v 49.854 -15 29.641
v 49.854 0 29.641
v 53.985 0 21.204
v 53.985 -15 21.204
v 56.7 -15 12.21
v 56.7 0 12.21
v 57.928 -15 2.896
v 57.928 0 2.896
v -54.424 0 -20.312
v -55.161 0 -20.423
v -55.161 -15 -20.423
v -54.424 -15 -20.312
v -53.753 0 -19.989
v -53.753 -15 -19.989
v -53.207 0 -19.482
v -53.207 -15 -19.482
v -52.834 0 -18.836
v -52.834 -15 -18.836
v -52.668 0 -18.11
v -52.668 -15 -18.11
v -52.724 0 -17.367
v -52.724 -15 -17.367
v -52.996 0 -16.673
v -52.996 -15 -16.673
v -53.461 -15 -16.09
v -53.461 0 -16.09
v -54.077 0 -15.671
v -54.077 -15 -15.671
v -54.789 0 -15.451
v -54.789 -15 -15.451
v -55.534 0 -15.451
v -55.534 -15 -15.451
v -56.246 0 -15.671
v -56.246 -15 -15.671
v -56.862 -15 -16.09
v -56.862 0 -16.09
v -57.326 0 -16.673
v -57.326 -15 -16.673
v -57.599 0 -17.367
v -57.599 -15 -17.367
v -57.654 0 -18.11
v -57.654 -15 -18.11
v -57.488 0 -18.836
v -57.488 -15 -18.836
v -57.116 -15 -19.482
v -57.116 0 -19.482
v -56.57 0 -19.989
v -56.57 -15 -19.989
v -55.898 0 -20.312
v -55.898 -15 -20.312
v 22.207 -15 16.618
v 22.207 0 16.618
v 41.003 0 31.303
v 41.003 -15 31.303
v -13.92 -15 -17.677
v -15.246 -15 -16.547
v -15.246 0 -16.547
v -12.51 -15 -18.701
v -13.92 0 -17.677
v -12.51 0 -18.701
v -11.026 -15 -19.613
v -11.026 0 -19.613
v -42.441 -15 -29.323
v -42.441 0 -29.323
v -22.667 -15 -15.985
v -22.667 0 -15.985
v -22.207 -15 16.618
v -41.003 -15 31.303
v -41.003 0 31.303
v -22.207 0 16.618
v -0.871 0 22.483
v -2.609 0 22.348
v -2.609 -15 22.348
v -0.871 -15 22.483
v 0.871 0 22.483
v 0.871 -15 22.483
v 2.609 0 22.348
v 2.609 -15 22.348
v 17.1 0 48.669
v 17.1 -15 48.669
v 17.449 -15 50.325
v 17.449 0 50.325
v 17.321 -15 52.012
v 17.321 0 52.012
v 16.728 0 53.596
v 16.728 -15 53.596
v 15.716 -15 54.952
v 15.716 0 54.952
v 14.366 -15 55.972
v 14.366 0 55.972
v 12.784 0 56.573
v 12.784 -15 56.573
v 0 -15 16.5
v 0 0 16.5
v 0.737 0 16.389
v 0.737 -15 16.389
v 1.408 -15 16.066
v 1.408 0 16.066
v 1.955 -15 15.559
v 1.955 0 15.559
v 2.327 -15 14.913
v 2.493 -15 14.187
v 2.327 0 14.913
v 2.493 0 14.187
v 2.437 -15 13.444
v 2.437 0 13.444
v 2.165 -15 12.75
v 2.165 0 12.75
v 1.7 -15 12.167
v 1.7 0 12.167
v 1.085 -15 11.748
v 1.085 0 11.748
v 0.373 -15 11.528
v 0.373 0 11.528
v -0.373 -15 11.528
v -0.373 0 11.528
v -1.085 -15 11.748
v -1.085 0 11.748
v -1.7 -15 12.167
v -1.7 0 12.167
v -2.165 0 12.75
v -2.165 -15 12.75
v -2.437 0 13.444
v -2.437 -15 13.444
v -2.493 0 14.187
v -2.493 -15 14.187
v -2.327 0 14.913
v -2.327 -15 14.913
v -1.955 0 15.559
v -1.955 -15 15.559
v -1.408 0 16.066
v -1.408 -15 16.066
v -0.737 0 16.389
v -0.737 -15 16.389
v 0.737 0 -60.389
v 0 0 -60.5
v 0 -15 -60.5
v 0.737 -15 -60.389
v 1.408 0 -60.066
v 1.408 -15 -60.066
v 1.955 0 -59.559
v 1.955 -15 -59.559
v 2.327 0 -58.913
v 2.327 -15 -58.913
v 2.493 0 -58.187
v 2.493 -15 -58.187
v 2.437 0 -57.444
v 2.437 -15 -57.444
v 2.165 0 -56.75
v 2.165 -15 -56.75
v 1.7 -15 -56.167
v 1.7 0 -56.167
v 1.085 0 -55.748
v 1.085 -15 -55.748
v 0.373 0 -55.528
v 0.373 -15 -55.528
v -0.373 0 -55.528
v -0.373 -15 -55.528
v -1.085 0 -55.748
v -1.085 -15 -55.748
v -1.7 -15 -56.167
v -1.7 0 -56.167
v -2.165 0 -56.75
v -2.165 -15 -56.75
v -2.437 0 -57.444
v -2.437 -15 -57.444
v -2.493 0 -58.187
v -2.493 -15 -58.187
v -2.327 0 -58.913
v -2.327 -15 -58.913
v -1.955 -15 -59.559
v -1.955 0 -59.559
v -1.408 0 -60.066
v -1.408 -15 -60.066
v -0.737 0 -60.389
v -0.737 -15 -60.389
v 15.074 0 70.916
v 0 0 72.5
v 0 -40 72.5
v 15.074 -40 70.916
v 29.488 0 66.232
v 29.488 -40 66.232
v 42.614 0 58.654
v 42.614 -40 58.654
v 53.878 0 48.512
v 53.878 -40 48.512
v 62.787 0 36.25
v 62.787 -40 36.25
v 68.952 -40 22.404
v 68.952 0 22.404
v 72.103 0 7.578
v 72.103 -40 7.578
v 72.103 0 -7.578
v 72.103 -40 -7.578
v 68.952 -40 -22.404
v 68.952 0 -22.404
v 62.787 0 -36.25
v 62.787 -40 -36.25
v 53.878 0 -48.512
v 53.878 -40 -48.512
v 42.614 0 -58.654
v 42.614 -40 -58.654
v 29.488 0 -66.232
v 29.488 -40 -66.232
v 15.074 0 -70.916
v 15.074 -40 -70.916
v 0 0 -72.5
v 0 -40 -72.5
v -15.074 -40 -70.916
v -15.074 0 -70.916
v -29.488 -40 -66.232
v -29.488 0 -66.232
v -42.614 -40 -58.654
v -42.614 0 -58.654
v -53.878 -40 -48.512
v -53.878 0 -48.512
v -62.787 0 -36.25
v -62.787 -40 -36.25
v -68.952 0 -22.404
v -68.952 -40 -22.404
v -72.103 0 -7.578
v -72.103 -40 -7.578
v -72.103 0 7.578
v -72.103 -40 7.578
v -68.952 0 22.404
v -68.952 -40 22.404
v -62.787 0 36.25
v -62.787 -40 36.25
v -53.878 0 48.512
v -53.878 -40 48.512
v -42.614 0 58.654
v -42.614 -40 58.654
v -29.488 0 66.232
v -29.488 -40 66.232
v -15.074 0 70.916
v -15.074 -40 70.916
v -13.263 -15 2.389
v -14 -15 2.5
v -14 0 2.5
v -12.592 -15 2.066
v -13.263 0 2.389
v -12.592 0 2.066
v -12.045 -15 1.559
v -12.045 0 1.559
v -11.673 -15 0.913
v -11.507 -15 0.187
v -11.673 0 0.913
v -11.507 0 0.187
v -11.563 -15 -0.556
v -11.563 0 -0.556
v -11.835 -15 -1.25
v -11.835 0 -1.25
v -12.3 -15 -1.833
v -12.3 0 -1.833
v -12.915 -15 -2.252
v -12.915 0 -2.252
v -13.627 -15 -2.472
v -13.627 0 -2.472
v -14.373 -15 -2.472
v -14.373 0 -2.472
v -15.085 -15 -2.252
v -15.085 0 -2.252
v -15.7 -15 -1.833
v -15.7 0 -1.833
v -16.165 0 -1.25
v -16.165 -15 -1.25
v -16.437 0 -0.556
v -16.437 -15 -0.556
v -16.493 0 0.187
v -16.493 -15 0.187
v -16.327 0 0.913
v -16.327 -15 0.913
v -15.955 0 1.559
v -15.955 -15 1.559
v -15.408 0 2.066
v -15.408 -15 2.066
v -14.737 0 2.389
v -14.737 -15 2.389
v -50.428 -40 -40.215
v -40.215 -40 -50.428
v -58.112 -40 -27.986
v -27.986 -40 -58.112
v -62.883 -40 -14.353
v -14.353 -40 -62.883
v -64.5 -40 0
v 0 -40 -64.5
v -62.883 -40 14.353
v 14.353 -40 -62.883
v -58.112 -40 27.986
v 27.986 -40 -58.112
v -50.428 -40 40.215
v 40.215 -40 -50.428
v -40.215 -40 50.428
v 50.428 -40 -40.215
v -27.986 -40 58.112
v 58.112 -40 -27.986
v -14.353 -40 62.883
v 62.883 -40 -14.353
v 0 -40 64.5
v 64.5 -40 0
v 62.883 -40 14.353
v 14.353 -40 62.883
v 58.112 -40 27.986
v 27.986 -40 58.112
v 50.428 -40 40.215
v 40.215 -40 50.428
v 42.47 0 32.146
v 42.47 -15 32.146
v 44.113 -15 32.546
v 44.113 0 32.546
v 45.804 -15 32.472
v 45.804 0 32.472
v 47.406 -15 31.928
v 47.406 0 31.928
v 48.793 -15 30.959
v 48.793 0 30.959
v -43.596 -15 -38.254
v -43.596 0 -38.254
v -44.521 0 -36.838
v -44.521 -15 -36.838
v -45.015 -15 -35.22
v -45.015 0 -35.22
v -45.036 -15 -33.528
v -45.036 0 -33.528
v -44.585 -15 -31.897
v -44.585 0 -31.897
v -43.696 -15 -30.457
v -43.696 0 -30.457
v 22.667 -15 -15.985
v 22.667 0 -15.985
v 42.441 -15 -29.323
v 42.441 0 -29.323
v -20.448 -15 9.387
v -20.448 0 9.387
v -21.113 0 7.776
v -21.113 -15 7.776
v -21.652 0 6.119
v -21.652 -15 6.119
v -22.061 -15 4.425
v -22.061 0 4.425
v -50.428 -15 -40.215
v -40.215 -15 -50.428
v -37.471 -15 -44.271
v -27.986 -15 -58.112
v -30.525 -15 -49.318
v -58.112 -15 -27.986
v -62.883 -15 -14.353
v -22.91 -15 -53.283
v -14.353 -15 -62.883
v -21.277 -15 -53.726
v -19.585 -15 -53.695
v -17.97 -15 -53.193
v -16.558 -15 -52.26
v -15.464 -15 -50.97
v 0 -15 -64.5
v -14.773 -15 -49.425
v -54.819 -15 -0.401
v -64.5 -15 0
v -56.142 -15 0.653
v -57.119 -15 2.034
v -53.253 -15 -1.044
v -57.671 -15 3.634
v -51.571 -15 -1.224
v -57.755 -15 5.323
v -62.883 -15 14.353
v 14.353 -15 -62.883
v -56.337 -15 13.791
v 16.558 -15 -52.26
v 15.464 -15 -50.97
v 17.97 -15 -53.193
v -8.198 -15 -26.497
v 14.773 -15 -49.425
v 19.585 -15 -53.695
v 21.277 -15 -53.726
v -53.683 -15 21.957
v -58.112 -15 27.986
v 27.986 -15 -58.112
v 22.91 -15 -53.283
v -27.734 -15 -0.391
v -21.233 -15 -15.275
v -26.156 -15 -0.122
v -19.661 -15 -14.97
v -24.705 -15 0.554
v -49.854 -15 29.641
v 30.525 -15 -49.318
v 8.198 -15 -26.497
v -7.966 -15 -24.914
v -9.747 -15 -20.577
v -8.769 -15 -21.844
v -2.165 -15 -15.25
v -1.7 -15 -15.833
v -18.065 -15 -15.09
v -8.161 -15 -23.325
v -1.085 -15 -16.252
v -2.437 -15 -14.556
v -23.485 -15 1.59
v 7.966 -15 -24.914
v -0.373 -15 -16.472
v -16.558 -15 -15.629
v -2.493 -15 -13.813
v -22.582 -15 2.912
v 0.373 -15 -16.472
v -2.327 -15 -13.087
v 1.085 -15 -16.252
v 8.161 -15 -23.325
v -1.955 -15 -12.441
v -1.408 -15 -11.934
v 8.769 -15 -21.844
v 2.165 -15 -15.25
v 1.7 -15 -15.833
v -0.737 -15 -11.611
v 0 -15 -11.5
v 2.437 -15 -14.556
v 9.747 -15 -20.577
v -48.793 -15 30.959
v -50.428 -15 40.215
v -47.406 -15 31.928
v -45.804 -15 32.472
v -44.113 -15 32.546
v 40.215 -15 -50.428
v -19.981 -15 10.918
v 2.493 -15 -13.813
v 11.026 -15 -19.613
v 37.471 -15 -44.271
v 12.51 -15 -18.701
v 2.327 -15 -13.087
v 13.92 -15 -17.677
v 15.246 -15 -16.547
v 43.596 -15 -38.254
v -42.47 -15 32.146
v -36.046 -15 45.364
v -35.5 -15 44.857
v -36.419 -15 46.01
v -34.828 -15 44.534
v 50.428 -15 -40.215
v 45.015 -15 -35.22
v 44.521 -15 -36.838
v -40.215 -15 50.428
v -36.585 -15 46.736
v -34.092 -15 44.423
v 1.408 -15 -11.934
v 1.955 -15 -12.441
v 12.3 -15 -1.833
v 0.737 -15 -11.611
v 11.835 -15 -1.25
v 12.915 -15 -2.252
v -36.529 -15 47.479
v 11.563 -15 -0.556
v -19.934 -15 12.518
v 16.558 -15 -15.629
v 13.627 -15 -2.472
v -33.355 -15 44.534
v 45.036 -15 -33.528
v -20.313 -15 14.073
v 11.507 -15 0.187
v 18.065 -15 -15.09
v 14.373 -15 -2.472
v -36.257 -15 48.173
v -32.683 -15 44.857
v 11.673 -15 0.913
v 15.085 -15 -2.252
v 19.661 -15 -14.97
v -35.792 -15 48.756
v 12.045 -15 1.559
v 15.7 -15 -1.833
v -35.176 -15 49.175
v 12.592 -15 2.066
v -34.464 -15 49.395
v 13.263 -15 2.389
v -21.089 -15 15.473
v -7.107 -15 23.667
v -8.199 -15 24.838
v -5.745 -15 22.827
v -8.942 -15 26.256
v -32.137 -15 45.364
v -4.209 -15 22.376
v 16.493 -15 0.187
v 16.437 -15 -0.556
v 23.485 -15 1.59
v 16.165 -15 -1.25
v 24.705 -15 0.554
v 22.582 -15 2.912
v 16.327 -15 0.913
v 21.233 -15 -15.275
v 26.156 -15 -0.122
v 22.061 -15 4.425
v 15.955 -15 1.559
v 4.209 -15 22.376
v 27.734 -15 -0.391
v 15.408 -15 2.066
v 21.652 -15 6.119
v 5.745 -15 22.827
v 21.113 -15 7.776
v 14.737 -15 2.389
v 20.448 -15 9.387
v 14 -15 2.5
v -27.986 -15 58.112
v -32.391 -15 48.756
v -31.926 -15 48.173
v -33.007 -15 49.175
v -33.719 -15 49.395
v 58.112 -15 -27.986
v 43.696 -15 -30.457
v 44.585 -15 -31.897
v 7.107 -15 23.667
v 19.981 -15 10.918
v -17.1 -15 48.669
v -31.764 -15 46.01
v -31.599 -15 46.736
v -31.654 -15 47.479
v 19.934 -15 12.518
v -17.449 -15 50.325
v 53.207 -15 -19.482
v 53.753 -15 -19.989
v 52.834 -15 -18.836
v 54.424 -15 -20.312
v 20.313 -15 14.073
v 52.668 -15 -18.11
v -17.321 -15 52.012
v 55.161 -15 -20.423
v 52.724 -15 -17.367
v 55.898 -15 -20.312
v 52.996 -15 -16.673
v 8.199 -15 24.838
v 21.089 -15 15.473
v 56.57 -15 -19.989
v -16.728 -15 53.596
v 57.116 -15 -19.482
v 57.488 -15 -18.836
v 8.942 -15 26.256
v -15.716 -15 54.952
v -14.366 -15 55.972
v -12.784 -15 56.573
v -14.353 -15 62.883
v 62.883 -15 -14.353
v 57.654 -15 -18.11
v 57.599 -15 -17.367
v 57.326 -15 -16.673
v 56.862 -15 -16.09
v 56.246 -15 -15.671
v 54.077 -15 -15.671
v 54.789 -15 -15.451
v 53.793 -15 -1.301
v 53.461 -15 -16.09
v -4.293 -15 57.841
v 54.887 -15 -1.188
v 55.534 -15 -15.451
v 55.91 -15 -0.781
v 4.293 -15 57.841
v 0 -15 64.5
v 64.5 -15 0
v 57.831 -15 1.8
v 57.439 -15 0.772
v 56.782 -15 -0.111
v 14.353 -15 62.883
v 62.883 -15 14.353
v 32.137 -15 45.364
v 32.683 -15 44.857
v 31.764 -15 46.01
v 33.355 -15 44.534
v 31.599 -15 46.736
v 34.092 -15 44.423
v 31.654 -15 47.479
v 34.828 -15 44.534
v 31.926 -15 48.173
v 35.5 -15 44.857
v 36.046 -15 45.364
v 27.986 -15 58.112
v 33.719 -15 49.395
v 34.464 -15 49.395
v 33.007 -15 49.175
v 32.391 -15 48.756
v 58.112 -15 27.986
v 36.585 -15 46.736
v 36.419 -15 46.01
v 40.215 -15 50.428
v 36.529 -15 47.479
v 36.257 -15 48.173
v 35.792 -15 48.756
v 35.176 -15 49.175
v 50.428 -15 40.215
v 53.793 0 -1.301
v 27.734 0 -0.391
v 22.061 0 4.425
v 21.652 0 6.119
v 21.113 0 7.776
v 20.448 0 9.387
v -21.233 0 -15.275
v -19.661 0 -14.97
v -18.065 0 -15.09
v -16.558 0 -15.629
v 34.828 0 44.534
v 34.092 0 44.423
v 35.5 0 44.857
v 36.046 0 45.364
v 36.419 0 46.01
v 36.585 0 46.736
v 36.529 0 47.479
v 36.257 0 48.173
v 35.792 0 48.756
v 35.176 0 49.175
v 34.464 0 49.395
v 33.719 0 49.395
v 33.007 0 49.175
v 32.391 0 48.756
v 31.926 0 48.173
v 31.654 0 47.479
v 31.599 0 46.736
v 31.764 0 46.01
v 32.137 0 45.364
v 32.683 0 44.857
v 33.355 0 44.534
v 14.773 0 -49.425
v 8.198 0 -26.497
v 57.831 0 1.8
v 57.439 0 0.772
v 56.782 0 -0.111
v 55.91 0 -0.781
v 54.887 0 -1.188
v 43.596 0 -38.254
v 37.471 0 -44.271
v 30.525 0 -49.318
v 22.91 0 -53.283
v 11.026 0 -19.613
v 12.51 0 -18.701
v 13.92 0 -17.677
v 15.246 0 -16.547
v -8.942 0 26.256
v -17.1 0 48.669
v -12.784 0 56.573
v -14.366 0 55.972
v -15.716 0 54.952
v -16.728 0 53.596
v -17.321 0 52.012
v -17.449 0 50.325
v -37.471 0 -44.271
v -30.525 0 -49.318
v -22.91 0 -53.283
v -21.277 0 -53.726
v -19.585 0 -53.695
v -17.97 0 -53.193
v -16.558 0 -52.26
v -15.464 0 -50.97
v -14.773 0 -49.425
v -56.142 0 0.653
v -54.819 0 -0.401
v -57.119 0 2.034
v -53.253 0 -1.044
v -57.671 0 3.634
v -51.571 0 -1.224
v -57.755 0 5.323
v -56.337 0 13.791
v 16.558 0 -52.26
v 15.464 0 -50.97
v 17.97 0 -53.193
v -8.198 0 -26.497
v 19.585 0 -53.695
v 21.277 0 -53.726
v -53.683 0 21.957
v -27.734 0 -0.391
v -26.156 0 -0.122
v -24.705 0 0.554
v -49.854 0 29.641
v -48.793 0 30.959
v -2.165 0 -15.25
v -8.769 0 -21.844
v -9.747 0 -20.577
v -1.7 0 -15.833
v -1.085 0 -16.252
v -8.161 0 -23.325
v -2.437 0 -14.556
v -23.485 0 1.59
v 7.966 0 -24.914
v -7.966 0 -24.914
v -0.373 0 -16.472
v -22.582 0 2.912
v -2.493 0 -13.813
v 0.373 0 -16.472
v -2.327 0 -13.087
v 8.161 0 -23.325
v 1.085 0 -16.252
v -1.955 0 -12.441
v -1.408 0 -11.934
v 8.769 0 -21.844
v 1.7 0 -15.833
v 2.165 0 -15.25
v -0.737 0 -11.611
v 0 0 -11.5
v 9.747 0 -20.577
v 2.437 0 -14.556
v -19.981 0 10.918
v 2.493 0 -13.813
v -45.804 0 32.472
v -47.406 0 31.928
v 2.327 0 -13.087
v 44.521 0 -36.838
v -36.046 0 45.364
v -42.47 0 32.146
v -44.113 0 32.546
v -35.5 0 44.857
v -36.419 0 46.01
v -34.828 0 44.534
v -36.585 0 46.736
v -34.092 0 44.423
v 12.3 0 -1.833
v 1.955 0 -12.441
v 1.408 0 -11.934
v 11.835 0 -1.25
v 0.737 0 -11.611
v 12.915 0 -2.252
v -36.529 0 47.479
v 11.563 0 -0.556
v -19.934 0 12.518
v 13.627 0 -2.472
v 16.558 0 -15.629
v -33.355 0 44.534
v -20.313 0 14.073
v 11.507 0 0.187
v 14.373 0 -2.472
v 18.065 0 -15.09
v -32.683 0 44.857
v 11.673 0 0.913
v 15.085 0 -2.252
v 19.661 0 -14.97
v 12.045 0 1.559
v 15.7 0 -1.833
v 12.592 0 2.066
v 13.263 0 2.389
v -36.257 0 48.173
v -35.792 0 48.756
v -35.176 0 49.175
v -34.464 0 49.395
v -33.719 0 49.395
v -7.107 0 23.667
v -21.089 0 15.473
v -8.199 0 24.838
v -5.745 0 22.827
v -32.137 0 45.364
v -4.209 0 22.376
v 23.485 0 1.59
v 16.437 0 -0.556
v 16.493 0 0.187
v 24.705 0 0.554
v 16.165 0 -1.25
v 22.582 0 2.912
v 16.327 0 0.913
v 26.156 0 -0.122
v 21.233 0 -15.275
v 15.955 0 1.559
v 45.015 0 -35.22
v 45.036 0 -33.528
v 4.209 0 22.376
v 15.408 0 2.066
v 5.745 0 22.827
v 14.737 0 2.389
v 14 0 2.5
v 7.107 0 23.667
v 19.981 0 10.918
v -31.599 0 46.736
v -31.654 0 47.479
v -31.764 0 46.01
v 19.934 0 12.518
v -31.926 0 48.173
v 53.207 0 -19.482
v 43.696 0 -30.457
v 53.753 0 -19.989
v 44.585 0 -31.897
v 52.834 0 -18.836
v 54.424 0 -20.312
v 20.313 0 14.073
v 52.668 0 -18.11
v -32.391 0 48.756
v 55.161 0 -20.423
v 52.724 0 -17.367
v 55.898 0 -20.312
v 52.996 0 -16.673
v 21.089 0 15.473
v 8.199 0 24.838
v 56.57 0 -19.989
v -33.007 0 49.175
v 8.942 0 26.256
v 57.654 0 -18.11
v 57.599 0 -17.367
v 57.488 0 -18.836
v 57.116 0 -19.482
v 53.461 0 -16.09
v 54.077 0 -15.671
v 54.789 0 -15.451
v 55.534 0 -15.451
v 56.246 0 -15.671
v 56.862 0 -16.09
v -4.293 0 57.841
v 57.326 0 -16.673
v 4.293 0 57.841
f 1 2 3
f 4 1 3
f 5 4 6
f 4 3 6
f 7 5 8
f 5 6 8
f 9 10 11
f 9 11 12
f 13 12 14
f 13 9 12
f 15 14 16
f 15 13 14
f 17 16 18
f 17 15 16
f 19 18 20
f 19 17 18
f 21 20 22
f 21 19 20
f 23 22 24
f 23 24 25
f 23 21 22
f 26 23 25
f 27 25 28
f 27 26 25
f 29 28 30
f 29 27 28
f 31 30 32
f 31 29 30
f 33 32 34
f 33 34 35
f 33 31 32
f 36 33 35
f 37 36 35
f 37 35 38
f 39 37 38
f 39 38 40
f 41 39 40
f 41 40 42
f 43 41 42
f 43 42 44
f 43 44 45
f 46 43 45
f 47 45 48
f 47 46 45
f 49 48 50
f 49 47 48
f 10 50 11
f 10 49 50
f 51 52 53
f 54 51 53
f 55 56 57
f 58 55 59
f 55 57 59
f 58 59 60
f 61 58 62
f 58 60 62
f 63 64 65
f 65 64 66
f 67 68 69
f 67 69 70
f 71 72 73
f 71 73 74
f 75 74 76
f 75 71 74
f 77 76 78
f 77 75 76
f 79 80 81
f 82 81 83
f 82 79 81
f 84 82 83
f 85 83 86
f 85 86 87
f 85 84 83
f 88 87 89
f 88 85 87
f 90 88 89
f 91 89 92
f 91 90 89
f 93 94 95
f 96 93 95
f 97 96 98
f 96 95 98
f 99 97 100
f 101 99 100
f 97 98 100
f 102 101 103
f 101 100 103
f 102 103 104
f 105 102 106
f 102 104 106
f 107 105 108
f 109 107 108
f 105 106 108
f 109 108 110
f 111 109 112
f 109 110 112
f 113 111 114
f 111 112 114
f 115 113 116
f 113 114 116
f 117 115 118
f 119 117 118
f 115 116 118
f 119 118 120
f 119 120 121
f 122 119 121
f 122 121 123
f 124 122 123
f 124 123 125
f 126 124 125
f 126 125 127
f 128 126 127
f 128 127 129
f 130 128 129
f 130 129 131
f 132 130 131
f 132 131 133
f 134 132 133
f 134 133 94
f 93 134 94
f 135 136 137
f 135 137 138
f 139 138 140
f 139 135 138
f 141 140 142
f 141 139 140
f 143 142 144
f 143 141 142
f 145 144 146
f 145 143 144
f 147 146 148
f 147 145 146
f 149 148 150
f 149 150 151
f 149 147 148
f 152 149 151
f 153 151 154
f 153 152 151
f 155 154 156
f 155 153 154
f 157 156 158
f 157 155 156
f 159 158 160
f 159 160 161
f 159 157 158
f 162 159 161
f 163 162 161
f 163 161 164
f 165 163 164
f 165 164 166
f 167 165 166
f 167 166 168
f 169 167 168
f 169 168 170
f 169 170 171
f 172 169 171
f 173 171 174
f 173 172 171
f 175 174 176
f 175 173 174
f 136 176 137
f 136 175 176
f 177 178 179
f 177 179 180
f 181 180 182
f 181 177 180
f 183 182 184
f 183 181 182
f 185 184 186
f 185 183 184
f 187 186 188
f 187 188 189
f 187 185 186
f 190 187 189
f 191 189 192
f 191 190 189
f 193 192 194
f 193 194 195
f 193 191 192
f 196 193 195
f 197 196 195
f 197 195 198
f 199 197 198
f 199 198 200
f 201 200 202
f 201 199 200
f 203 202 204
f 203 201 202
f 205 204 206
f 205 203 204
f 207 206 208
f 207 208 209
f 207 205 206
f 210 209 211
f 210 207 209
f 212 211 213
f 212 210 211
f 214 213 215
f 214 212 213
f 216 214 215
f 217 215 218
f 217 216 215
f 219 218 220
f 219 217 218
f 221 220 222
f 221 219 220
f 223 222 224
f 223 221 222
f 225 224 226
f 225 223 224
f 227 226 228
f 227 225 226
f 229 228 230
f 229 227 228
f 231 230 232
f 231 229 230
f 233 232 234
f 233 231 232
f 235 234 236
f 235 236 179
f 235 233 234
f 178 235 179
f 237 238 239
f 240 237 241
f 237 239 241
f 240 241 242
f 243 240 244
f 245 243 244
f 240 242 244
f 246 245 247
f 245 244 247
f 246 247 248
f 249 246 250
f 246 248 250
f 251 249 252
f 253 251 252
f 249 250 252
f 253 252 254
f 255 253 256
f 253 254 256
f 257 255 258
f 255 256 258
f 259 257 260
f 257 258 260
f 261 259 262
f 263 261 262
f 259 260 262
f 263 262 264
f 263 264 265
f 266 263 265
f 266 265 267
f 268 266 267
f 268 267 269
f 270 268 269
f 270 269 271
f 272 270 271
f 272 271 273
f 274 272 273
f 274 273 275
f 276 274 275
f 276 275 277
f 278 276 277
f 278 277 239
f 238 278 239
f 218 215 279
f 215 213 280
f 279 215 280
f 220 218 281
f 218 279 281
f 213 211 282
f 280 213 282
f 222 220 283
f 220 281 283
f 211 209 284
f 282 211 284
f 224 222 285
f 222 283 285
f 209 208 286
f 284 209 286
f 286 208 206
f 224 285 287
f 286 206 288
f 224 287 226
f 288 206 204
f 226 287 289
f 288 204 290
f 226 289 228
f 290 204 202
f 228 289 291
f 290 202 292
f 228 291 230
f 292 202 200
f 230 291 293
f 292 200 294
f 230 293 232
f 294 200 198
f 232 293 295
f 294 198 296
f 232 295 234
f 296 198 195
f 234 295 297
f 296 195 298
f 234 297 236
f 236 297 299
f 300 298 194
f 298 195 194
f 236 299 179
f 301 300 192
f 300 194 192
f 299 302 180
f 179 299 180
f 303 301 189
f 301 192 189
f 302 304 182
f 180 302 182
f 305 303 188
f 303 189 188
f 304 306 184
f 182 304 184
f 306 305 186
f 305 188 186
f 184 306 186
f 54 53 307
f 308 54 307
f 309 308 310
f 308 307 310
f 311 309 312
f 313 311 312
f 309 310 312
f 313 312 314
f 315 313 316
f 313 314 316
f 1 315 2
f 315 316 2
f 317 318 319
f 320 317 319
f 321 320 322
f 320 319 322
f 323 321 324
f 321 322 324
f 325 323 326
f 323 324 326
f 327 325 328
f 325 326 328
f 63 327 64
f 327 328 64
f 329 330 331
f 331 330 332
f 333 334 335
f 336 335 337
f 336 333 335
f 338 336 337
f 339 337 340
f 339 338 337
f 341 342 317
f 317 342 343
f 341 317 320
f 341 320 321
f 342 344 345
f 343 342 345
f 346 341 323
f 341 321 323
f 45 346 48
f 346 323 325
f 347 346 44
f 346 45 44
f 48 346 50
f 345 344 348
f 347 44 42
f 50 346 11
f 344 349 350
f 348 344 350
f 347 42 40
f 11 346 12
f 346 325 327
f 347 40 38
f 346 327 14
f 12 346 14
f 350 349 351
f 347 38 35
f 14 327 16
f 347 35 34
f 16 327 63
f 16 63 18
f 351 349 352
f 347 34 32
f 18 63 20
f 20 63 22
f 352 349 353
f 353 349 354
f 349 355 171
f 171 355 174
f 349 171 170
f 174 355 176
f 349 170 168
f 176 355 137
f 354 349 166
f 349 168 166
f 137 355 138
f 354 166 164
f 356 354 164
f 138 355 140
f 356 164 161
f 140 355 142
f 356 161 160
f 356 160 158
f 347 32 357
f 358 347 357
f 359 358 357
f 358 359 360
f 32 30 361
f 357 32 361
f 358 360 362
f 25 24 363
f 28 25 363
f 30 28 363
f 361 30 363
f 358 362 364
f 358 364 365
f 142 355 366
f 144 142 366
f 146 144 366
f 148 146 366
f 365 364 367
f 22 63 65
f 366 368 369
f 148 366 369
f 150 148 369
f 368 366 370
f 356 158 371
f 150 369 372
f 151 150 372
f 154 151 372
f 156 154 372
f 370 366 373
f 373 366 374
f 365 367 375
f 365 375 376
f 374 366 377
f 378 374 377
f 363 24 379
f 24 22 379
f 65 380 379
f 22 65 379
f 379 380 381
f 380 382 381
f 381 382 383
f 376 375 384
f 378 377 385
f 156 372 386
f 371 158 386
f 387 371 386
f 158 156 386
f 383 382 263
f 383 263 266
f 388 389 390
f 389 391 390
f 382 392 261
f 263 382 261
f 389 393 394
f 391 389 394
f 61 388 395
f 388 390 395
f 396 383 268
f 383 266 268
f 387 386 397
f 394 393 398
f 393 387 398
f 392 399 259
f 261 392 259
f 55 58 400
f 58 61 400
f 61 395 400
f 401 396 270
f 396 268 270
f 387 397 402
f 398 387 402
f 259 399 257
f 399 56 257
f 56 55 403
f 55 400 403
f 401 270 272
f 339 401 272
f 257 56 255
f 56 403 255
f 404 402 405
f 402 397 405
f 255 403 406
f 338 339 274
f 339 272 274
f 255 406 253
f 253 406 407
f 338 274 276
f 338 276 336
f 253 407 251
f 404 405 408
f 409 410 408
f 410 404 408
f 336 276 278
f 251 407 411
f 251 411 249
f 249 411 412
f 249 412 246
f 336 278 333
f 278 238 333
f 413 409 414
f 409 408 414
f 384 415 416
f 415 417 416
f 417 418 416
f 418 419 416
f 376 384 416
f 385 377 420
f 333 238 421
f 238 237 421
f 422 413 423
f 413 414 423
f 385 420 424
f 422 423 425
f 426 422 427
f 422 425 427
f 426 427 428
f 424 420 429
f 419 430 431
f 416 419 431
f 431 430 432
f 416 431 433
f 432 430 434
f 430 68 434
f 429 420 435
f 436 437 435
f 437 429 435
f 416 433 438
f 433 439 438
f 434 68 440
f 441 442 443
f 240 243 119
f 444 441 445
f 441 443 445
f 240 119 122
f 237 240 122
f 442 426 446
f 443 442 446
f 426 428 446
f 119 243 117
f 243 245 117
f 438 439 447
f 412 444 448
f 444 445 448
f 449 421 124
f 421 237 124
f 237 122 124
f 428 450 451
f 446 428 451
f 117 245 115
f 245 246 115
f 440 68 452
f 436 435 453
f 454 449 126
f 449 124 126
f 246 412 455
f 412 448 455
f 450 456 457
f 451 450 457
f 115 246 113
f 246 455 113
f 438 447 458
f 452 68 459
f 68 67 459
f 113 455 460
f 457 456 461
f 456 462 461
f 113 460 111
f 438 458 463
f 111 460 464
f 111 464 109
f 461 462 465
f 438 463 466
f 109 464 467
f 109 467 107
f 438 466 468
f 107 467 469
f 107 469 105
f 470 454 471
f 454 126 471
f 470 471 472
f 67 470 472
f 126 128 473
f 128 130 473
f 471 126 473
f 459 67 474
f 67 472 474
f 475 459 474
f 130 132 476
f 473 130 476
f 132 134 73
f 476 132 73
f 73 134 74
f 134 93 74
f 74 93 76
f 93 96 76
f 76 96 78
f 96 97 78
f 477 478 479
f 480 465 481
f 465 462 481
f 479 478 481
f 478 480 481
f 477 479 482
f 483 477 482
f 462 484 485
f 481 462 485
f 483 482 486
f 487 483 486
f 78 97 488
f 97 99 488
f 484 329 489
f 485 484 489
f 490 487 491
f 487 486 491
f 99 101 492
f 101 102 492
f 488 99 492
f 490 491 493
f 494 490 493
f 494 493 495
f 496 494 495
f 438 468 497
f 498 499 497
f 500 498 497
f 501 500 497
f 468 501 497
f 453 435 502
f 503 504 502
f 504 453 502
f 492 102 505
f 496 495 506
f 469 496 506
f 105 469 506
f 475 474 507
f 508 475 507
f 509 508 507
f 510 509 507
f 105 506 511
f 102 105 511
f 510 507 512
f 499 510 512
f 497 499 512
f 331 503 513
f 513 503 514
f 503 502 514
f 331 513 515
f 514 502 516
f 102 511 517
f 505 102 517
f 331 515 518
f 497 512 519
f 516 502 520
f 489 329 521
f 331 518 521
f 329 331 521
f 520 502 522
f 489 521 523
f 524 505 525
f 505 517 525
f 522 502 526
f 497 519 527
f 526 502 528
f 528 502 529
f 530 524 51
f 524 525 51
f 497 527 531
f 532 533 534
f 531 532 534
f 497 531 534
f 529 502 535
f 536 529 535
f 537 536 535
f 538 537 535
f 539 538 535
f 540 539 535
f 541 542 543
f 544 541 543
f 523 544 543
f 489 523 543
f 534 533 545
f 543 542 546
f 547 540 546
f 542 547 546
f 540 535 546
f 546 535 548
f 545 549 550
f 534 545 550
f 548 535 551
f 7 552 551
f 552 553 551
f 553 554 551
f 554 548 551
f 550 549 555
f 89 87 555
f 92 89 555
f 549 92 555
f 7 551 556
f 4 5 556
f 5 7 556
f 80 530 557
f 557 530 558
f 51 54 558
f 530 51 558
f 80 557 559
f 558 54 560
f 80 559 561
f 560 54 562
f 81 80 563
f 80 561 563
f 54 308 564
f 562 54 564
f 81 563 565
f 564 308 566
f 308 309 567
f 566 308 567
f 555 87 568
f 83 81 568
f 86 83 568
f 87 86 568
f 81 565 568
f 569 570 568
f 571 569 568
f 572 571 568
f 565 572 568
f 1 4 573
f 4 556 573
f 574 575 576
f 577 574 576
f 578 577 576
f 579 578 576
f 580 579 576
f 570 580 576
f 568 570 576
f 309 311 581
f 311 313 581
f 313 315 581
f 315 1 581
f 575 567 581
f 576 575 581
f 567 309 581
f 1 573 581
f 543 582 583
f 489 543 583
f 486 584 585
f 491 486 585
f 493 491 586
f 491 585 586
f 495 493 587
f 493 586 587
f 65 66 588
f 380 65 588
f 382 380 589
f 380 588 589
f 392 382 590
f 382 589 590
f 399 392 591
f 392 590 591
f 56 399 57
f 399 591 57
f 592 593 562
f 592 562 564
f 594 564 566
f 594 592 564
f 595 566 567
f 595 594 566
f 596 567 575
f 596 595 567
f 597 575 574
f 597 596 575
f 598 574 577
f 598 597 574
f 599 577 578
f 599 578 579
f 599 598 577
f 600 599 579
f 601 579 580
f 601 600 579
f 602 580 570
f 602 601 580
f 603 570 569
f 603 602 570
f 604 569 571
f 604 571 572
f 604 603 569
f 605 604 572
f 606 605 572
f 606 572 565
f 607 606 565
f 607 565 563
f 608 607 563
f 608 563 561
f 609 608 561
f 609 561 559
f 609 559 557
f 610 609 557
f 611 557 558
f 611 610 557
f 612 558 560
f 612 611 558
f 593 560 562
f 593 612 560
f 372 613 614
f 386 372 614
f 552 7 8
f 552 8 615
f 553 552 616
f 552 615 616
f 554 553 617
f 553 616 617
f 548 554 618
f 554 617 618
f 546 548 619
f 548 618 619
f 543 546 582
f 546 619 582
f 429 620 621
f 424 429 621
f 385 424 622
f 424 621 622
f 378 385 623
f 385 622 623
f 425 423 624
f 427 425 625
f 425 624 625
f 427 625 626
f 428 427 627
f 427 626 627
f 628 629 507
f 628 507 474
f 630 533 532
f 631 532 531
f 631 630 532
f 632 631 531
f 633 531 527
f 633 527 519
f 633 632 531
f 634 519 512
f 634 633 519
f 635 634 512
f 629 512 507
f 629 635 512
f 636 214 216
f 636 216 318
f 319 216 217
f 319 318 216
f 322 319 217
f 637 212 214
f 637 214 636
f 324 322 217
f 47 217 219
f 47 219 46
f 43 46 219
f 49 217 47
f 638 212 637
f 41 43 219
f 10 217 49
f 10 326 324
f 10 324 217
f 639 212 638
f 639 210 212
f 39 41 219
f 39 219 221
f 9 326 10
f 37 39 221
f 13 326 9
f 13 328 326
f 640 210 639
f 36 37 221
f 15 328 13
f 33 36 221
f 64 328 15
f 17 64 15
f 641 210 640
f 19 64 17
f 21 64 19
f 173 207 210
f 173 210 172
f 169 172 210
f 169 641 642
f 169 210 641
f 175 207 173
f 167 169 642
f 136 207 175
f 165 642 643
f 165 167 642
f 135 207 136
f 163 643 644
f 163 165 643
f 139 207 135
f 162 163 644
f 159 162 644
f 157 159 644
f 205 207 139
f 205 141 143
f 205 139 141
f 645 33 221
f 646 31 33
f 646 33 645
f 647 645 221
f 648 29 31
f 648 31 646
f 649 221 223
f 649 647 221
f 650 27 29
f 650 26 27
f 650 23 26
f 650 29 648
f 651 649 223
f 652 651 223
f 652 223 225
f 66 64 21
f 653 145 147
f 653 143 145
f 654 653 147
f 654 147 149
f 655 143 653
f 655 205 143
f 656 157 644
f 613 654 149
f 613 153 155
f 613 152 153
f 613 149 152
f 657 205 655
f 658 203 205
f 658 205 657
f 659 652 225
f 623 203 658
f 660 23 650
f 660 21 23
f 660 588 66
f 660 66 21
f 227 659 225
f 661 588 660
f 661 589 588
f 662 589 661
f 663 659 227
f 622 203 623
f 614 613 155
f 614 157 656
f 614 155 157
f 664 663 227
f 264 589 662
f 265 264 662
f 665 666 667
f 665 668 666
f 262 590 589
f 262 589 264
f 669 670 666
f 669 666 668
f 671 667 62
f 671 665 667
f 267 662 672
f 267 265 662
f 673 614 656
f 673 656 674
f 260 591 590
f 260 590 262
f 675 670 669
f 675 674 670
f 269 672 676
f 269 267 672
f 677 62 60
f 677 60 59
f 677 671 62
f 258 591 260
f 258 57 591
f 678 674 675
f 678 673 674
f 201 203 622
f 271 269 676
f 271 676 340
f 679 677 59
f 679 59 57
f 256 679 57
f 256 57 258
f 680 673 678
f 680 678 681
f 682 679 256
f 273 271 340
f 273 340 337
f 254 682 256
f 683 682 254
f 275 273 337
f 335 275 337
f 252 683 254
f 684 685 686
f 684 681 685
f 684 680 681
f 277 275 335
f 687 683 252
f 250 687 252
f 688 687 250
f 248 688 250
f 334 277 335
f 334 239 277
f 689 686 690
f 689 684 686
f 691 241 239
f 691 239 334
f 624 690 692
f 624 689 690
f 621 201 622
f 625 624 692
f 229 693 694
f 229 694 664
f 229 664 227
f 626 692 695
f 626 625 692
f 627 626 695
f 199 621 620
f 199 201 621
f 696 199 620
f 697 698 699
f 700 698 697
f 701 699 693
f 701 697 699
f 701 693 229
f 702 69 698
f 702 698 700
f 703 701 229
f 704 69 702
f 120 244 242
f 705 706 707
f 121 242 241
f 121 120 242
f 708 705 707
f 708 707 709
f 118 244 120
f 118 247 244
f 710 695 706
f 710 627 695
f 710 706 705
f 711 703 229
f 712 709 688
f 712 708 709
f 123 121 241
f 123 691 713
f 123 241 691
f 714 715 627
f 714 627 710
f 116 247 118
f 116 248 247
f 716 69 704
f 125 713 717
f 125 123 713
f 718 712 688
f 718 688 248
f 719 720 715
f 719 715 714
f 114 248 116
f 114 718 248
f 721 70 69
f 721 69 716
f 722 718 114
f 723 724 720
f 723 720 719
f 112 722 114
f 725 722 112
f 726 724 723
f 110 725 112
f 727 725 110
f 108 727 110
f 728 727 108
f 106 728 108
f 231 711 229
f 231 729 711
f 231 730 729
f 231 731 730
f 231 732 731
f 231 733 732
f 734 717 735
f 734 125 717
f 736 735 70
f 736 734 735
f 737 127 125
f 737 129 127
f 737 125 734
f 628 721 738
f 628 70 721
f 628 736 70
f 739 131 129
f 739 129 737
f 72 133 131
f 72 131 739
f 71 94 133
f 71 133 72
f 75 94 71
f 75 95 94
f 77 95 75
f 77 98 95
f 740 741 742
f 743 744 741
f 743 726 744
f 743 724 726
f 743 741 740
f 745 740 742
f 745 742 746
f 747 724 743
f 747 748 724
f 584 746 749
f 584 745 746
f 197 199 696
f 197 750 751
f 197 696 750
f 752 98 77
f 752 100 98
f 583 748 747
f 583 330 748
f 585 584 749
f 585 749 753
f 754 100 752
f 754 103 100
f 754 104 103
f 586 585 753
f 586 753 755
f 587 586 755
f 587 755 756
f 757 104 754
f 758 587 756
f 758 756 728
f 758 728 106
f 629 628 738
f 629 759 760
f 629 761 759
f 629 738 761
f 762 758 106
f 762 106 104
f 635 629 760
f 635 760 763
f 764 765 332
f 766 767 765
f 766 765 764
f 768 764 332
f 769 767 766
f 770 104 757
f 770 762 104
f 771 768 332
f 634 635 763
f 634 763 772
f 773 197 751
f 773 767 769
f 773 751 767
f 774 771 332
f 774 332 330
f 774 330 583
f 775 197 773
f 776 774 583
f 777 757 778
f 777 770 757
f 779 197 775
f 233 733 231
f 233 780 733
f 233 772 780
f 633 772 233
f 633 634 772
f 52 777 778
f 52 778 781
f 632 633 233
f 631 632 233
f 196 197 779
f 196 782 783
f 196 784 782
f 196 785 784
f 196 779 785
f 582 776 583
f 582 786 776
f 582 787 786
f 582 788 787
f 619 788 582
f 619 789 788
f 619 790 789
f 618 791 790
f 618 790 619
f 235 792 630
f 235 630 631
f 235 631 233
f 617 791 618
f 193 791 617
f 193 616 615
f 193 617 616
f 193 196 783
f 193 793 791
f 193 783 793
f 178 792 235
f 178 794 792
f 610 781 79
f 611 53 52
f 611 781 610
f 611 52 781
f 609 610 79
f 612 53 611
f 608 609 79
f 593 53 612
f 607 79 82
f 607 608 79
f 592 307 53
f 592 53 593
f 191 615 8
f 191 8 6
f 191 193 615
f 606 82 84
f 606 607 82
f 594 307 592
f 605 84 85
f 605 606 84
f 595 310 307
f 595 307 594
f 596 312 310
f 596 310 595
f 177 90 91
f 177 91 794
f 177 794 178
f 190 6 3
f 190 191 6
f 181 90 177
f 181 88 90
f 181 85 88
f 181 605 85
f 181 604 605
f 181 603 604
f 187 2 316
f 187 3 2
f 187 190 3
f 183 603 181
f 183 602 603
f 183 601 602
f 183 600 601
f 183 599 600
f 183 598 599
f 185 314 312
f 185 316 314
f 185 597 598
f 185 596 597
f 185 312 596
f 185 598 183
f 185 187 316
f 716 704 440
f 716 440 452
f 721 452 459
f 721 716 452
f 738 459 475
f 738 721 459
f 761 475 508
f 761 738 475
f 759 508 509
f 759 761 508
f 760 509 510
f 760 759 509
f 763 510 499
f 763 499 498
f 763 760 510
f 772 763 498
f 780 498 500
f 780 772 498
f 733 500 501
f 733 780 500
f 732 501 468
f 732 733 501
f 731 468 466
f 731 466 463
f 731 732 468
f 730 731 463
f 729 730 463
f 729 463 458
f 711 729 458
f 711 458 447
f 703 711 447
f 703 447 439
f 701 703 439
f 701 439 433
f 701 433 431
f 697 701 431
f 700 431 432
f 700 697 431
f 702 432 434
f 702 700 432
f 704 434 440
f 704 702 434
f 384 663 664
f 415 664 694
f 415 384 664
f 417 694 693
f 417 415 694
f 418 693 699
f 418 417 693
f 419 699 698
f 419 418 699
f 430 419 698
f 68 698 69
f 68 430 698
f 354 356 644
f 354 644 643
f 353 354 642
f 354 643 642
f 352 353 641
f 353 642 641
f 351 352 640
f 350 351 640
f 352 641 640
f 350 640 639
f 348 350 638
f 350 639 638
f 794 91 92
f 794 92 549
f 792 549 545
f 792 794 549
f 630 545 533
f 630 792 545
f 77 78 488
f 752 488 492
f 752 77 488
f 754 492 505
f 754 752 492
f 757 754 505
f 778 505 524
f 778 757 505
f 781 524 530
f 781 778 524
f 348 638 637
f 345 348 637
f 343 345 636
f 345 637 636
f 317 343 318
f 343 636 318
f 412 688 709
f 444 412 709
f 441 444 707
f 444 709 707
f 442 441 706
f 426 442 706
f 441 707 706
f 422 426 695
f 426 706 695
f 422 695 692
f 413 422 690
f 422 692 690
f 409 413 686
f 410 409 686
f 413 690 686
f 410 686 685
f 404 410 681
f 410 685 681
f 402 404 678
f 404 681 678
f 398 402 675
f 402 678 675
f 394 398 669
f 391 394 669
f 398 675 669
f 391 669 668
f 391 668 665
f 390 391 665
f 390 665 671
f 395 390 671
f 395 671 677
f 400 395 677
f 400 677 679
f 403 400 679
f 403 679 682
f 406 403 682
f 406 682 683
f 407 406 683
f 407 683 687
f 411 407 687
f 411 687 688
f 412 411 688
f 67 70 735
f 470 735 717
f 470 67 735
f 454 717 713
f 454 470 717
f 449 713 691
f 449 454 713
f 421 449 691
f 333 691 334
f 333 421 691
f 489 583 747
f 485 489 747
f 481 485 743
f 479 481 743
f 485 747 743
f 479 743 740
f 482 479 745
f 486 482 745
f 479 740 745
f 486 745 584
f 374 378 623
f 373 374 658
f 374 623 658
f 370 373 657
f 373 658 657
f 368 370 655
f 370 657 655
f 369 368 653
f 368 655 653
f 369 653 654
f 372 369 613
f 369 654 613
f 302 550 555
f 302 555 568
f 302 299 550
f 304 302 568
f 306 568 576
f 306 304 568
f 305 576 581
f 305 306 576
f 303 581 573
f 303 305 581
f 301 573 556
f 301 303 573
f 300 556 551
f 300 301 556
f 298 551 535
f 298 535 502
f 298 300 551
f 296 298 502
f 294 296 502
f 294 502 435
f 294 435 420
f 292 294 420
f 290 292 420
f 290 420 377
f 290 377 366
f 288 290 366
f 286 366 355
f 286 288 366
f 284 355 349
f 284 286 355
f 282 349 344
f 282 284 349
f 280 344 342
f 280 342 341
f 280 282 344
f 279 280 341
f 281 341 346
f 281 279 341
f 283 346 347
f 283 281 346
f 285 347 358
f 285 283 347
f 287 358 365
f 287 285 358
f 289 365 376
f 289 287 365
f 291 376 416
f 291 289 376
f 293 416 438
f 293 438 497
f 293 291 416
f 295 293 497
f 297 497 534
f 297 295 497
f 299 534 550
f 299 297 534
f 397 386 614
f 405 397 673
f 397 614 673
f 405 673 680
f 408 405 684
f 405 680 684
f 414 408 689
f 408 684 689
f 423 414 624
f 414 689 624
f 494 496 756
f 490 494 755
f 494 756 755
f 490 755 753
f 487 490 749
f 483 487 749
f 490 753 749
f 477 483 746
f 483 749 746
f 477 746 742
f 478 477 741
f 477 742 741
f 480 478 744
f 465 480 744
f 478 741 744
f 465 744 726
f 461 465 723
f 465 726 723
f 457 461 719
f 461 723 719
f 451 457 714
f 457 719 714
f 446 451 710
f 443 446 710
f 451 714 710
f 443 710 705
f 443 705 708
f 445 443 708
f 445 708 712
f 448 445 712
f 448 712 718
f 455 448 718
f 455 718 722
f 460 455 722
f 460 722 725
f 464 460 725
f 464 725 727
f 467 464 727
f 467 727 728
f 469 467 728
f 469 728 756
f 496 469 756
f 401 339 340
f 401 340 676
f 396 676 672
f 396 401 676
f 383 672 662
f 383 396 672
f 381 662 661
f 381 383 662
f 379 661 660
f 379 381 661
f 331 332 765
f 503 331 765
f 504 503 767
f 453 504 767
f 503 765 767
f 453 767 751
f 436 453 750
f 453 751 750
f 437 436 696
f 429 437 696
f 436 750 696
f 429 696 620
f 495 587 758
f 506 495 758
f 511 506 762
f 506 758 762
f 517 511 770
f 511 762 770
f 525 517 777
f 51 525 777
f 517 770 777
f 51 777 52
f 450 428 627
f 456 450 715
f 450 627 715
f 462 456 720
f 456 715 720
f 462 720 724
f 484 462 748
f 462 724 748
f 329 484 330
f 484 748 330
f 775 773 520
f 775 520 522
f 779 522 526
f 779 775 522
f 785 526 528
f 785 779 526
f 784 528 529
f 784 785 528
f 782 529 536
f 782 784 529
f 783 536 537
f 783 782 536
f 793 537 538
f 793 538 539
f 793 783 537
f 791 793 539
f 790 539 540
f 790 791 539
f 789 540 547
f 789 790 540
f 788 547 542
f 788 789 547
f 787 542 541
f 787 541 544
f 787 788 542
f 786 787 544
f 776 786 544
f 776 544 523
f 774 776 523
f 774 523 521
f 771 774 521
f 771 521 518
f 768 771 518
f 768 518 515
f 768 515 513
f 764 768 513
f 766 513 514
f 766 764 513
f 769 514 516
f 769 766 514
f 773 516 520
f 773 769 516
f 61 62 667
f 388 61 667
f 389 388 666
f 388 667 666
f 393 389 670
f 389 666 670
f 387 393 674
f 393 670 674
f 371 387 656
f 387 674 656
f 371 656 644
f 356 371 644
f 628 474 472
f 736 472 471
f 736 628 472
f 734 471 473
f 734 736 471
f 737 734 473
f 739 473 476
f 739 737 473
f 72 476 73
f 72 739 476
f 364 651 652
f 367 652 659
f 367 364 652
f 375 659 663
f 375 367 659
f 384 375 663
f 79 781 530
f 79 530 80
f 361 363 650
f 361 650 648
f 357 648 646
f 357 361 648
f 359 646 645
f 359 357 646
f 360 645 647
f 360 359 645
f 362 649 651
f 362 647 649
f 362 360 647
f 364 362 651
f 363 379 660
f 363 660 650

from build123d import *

# Parameters (mm, degrees)
SKETCH1_R           = 72.5
SKETCH1_R_2         = 64.5
BOSS_EXTRUDE1_DEPTH = 40
SKETCH4_R           = 64.5
BOSS_EXTRUDE3_DEPTH = 15
SKETCH3_R           = 2.5
CUT_EXTRUDE1_DEPTH  = 15
SKETCH6_R           = 2.5
CUT_EXTRUDE2_DEPTH  = 30
SKETCH7_R           = 72.5
CUT_EXTRUDE3_DEPTH  = 40


with BuildPart() as part:
    # Sketch1 → Boss-Extrude1 (new, symmetric)
    with BuildSketch(Plane(origin=(0, 0, 0), x_dir=(1, 0, 0), z_dir=(0, 1, 0))):
        with Locations(Location((0, 0, 0), (0, 0, 270))):
            Circle(SKETCH1_R)
        with Locations(Location((0, 0, 0), (0, 0, 270))):
            Circle(SKETCH1_R_2, mode=Mode.SUBTRACT)
    extrude(amount=BOSS_EXTRUDE1_DEPTH, both=True)

    # Sketch4 → Boss-Extrude3 (add, symmetric)
    with BuildSketch(Plane(origin=(0, 0, 0), x_dir=(1, 0, 0), z_dir=(0, 1, 0))):
        with Locations(Location((0, 0, 0), (0, 0, 270))):
            Circle(SKETCH4_R)
    extrude(amount=BOSS_EXTRUDE3_DEPTH, both=True)

    # Sketch3 → Cut-Extrude1 (cut, symmetric)
    with BuildSketch(Plane.XZ):
        with Locations(Location((-34.091544633, 46.922985674, 0), (0, 0, 270))):
            Circle(SKETCH3_R)
        with Locations(Location((34.091544633, 46.922985674, 0), (0, 0, 270))):
            Circle(SKETCH3_R)
        with Locations(Location((55.161277945, -17.922985674, 0), (0, 0, 270))):
            Circle(SKETCH3_R)
        with Locations(Location((0, -58, 0), (0, 0, 270))):
            Circle(SKETCH3_R)
        with Locations(Location((-55.161277945, -17.922985674, 0), (0, 0, 270))):
            Circle(SKETCH3_R)
        with BuildLine():
            Line((8.942342186, 26.255693464), (17.100089792, 48.668920804))
            ThreePointArc((17.100089792, 48.668920804), (16.728172015, 53.596235201), (12.784464921, 56.573469548))
            ThreePointArc((12.784464921, 56.573469548), (0, 58), (-12.784464921, 56.573469548))
            ThreePointArc((-12.784464921, 56.573469548), (-16.728172015, 53.596235201), (-17.100089792, 48.668920804))
            Line((-17.100089792, 48.668920804), (-8.942342186, 26.255693464))
            ThreePointArc((-8.942342186, 26.255693464), (-6.454448371, 23.201362532), (-2.608568259, 22.348274467))
            ThreePointArc((-2.608568259, 22.348274467), (0, 22.5), (2.608568259, 22.348274467))
            ThreePointArc((2.608568259, 22.348274467), (6.454448371, 23.201362532), (8.942342186, 26.255693464))
        make_face()
        with BuildLine():
            Line((22.207312654, 16.618128287), (41.002675921, 31.302675452))
            ThreePointArc((41.002675921, 31.302675452), (45.803759299, 32.471584512), (49.853949939, 29.640912191))
            ThreePointArc((49.853949939, 29.640912191), (55.525129356, 16.76186177), (57.927651105, 2.896072756))
            ThreePointArc((57.927651105, 2.896072756), (56.782266496, -0.110724751), (53.793042698, -1.301219707))
            Line((53.793042698, -1.301219707), (27.733984064, -0.391217328))
            ThreePointArc((27.733984064, -0.391217328), (24.060341259, 1.031070133), (22.060563983, 4.425100764))
            ThreePointArc((22.060563983, 4.425100764), (21.398771617, 6.952882373), (20.448380136, 9.386892446))
            ThreePointArc((20.448380136, 9.386892446), (20.071272788, 13.308160497), (22.207312654, 16.618128287))
        make_face()
        with BuildLine():
            Line((22.667216205, -15.985125354), (42.44113714, -29.322803436))
            ThreePointArc((42.44113714, -29.322803436), (45.036452074, -33.527692304), (43.595900456, -38.254378356))
            ThreePointArc((43.595900456, -38.254378356), (34.091544633, -46.922985674), (22.910201686, -53.283418234))
            ThreePointArc((22.910201686, -53.283418234), (17.969701185, -53.19283792), (14.772610647, -49.42516462))
            Line((14.772610647, -49.42516462), (8.198202609, -26.49747907))
            ThreePointArc((8.198202609, -26.49747907), (8.415660309, -22.564126145), (11.025610093, -19.613411791))
            ThreePointArc((11.025610093, -19.613411791), (13.225168177, -18.202882373), (15.246362198, -16.546855886))
            ThreePointArc((15.246362198, -16.546855886), (18.859177151, -14.976467017), (22.667216205, -15.985125354))
        make_face()
        with BuildLine():
            Line((-8.198202609, -26.49747907), (-14.772610647, -49.42516462))
            ThreePointArc((-14.772610647, -49.42516462), (-17.969701185, -53.19283792), (-22.910201686, -53.283418234))
            ThreePointArc((-22.910201686, -53.283418234), (-34.091544633, -46.922985674), (-43.595900456, -38.254378356))
            ThreePointArc((-43.595900456, -38.254378356), (-45.036452074, -33.527692304), (-42.44113714, -29.322803436))
            Line((-42.44113714, -29.322803436), (-22.667216205, -15.985125354))
            ThreePointArc((-22.667216205, -15.985125354), (-18.859177151, -14.976467017), (-15.246362198, -16.546855886))
            ThreePointArc((-15.246362198, -16.546855886), (-13.225168177, -18.202882373), (-11.025610093, -19.613411791))
            ThreePointArc((-11.025610093, -19.613411791), (-8.415660309, -22.564126145), (-8.198202609, -26.49747907))
        make_face()
        with BuildLine():
            Line((-27.733984064, -0.391217328), (-51.571112622, -1.223628199))
            ThreePointArc((-51.571112622, -1.223628199), (-56.142338174, 0.652710511), (-57.755183787, 5.323414851))
            ThreePointArc((-57.755183787, 5.323414851), (-55.161277945, 17.922985674), (-49.853949939, 29.640912191))
            ThreePointArc((-49.853949939, 29.640912191), (-45.803759299, 32.471584512), (-41.002675921, 31.302675452))
            Line((-41.002675921, 31.302675452), (-22.207312654, 16.618128287))
            ThreePointArc((-22.207312654, 16.618128287), (-20.071272788, 13.308160497), (-20.448380136, 9.386892446))
            ThreePointArc((-20.448380136, 9.386892446), (-21.398771617, 6.952882373), (-22.060563983, 4.425100764))
            ThreePointArc((-22.060563983, 4.425100764), (-24.060341259, 1.031070133), (-27.733984064, -0.391217328))
        make_face()
    extrude(amount=CUT_EXTRUDE1_DEPTH, both=True, mode=Mode.SUBTRACT)

    # Sketch6 → Cut-Extrude2 (cut)
    with BuildSketch(Plane(origin=(0, 15, 0), x_dir=(1, 0, 0), z_dir=(0, 1, 0))):
        with Locations(Location((0, 14, 0), (0, 0, 270))):
            Circle(SKETCH6_R)
        with Locations(Location((14, 0, 0), (0, 0, 270))):
            Circle(SKETCH6_R)
        with Locations(Location((0, -14, 0), (0, 0, 270))):
            Circle(SKETCH6_R)
        with Locations(Location((-14, 0, 0), (0, 0, 270))):
            Circle(SKETCH6_R)
    extrude(amount=-CUT_EXTRUDE2_DEPTH, mode=Mode.SUBTRACT)

    # Sketch7 → Cut-Extrude3 (cut)
    with BuildSketch(Plane(origin=(0, 40, 0), x_dir=(1, 0, 0), z_dir=(0, 1, 0))):
        with Locations(Location((0, 0, 0), (0, 0, 270))):
            Circle(SKETCH7_R)
    extrude(amount=-CUT_EXTRUDE3_DEPTH, mode=Mode.SUBTRACT)


solid = part.part
